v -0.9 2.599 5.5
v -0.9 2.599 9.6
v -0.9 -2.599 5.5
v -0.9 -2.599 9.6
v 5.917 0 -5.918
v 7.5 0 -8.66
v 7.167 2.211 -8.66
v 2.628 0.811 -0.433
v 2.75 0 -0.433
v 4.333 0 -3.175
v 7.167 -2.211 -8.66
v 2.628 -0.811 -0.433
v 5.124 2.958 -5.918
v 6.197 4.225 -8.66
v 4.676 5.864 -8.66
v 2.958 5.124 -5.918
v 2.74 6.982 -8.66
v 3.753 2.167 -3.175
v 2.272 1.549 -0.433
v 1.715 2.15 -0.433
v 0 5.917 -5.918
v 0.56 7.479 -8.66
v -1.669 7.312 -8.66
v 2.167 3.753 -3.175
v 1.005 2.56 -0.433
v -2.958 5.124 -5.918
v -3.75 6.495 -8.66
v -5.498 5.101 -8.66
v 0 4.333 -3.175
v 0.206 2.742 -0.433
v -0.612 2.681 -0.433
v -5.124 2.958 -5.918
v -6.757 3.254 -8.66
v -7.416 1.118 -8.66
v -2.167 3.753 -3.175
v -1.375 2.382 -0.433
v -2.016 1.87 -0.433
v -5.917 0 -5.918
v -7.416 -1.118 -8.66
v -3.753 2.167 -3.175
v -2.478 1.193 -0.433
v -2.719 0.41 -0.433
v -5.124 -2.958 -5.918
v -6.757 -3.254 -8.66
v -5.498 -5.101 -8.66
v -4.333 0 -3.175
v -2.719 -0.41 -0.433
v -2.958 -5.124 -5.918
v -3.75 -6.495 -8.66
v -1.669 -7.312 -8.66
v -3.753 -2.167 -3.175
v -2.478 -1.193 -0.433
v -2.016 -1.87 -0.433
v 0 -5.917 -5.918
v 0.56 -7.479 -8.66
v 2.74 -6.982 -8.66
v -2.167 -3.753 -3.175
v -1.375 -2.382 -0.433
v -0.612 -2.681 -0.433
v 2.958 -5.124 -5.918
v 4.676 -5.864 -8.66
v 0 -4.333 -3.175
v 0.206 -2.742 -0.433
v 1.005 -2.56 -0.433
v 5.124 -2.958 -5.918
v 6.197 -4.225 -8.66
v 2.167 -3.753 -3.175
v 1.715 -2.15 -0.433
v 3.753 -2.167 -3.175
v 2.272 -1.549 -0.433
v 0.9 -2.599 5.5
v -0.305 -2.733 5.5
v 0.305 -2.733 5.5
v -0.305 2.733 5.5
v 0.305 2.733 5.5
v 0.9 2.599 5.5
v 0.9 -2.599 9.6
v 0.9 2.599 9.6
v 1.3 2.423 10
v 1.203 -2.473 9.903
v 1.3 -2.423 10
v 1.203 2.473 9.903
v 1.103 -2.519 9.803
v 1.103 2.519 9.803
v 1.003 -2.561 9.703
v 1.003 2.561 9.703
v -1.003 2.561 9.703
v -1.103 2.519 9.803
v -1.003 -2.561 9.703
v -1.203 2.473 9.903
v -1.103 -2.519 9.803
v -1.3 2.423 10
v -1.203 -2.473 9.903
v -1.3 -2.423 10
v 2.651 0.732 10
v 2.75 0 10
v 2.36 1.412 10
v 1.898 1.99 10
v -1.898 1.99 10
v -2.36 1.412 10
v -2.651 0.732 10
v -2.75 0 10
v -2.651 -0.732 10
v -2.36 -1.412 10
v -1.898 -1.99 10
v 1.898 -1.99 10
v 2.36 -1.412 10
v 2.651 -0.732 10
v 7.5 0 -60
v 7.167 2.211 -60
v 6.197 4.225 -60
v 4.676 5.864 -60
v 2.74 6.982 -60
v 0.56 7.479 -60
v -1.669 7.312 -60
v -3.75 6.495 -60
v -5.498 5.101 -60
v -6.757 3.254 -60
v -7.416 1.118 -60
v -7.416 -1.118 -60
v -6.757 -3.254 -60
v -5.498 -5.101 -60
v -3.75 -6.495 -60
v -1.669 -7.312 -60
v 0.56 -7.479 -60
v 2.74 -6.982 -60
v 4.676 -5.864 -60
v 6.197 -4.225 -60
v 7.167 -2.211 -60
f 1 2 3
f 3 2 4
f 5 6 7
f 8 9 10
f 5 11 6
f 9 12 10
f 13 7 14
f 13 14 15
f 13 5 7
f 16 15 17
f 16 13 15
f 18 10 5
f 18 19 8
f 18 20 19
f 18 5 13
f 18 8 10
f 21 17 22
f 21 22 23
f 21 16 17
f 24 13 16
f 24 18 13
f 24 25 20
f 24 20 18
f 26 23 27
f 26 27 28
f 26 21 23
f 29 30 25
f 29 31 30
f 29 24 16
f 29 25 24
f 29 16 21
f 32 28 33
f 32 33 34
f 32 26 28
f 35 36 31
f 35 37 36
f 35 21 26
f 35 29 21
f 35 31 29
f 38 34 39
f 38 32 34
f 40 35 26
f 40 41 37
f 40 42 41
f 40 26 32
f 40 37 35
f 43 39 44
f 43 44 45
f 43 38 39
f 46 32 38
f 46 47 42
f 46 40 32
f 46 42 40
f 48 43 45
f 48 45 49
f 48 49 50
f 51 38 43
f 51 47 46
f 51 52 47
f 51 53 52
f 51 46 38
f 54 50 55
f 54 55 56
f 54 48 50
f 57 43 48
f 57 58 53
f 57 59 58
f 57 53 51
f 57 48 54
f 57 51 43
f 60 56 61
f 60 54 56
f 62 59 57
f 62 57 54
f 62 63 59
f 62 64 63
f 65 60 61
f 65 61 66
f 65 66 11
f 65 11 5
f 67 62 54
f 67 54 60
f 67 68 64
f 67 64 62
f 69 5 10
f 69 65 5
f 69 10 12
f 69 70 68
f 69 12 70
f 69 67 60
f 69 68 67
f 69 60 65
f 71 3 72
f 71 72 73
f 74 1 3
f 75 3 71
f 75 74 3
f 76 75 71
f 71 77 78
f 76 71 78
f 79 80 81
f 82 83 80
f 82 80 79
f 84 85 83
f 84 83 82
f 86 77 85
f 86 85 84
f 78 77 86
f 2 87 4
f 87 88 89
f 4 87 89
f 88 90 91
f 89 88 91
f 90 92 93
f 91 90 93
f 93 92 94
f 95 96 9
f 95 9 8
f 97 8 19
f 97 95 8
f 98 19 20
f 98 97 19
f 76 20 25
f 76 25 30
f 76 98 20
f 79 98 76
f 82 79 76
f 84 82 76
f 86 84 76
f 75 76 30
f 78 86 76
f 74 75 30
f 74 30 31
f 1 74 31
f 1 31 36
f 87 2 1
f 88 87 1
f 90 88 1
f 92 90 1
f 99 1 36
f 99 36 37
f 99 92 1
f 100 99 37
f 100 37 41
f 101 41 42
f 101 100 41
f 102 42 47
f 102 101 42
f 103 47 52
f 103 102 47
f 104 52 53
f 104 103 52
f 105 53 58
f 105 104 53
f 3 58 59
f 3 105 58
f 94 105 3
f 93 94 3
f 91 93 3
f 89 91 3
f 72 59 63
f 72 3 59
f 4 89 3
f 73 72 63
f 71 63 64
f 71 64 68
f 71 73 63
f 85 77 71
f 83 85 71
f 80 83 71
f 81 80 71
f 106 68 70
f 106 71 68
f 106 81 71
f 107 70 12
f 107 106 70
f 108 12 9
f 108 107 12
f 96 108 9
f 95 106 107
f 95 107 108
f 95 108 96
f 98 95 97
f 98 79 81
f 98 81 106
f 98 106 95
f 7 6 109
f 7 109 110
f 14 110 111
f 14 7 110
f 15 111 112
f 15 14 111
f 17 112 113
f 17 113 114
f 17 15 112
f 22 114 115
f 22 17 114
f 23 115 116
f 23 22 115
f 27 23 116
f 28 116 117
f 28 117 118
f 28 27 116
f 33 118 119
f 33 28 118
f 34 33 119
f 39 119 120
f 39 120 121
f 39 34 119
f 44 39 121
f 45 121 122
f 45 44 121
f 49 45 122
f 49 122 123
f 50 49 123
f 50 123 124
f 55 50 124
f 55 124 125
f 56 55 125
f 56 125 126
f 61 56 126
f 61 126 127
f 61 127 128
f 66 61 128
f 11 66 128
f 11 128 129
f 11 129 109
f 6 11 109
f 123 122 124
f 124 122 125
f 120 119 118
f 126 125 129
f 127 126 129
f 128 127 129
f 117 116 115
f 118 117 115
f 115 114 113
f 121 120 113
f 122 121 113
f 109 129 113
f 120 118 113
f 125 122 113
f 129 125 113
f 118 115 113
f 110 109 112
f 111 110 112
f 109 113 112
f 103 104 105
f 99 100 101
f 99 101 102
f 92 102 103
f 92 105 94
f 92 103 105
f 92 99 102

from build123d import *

# Parameters (mm, degrees)
F0_R        = 7.5
F0_R_2      = 2.75
F1_DEPTH    = 60
F2_DEPTH    = 10
F3_S5_R     = 2.75
F3_T6_DEPTH = 13
F5_DEPTH    = 4.5
F6_SIZE     = 0.4


# Not quite as in the source:
# - a fillet or chamfer that OpenCascade refuses, or shapes differently, is made with other operations: its cross-section is extruded or revolved along the edge and cut away or added


with BuildPart() as f1:
    # F0 (on Top) → F1 (new body)
    with BuildSketch(Plane.XY):
        Circle(F0_R)
        Circle(F0_R_2, mode=Mode.SUBTRACT)
        Circle(F0_R_2)
    extrude(amount=-F1_DEPTH)

    # F0 (on Top) → F2 (join)
    with BuildSketch(Plane.XY):
        Circle(F0_R_2)
    extrude(amount=F2_DEPTH)

    # F3: chamfer of 5 x 8.6602540378 on 1 edges, made by hand


with BuildPart() as f3_tool2:
    # F3_s3 → F3_t4 (revolve)
    with BuildSketch(Plane.XZ):
        Polygon((7.5, -8.6602540378), (2.5, 0), (7.5, 0), align=None)
    revolve(axis=Axis((0, 0, 0), (0, 0, 1)))

    # F3_s5 → F3_t6 (cut, symmetric)
    with BuildSketch(Plane.XY.offset(-4.3)):
        Circle(F3_S5_R)
    extrude(amount=F3_T6_DEPTH, both=True, mode=Mode.SUBTRACT)


with BuildPart() as f1_1:
    add(f1.part)

    # F3_t1: cut F3_tool2
    add(f3_tool2.part, mode=Mode.SUBTRACT)

    # F4 (on face) → F5 (cut)
    with BuildSketch(Plane.XY.offset(10)):
        with BuildLine():
            ThreePointArc((-0.9, -2.598557292), (0, -2.75), (0.9, -2.598557292))
            Line((0.9, -2.598557292), (0.9, 2.598557292))
            ThreePointArc((0.9, 2.598557292), (0, 2.75), (-0.9, 2.598557292))
            Line((-0.9, 2.598557292), (-0.9, -2.598557292))
        make_face()
        with BuildLine():
            ThreePointArc((-0.9, 2.598557292), (0, 2.75), (0.9, 2.598557292))
            Line((0.9, 2.598557292), (0.9, 4.5331302099))
            Line((0.9, 4.5331302099), (-0.9, 4.5331302099))
            Line((-0.9, 4.5331302099), (-0.9, 2.598557292))
        make_face()
    extrude(amount=-F5_DEPTH, mode=Mode.SUBTRACT)

    # F6
    f6_edges = [f1_1.edges().sort_by_distance(p)[0] for p in [
        (-0.9, 0, 10),
        (0.9, 0, 10),
    ]]
    chamfer(f6_edges, length=F6_SIZE)


solid = f1_1.part
